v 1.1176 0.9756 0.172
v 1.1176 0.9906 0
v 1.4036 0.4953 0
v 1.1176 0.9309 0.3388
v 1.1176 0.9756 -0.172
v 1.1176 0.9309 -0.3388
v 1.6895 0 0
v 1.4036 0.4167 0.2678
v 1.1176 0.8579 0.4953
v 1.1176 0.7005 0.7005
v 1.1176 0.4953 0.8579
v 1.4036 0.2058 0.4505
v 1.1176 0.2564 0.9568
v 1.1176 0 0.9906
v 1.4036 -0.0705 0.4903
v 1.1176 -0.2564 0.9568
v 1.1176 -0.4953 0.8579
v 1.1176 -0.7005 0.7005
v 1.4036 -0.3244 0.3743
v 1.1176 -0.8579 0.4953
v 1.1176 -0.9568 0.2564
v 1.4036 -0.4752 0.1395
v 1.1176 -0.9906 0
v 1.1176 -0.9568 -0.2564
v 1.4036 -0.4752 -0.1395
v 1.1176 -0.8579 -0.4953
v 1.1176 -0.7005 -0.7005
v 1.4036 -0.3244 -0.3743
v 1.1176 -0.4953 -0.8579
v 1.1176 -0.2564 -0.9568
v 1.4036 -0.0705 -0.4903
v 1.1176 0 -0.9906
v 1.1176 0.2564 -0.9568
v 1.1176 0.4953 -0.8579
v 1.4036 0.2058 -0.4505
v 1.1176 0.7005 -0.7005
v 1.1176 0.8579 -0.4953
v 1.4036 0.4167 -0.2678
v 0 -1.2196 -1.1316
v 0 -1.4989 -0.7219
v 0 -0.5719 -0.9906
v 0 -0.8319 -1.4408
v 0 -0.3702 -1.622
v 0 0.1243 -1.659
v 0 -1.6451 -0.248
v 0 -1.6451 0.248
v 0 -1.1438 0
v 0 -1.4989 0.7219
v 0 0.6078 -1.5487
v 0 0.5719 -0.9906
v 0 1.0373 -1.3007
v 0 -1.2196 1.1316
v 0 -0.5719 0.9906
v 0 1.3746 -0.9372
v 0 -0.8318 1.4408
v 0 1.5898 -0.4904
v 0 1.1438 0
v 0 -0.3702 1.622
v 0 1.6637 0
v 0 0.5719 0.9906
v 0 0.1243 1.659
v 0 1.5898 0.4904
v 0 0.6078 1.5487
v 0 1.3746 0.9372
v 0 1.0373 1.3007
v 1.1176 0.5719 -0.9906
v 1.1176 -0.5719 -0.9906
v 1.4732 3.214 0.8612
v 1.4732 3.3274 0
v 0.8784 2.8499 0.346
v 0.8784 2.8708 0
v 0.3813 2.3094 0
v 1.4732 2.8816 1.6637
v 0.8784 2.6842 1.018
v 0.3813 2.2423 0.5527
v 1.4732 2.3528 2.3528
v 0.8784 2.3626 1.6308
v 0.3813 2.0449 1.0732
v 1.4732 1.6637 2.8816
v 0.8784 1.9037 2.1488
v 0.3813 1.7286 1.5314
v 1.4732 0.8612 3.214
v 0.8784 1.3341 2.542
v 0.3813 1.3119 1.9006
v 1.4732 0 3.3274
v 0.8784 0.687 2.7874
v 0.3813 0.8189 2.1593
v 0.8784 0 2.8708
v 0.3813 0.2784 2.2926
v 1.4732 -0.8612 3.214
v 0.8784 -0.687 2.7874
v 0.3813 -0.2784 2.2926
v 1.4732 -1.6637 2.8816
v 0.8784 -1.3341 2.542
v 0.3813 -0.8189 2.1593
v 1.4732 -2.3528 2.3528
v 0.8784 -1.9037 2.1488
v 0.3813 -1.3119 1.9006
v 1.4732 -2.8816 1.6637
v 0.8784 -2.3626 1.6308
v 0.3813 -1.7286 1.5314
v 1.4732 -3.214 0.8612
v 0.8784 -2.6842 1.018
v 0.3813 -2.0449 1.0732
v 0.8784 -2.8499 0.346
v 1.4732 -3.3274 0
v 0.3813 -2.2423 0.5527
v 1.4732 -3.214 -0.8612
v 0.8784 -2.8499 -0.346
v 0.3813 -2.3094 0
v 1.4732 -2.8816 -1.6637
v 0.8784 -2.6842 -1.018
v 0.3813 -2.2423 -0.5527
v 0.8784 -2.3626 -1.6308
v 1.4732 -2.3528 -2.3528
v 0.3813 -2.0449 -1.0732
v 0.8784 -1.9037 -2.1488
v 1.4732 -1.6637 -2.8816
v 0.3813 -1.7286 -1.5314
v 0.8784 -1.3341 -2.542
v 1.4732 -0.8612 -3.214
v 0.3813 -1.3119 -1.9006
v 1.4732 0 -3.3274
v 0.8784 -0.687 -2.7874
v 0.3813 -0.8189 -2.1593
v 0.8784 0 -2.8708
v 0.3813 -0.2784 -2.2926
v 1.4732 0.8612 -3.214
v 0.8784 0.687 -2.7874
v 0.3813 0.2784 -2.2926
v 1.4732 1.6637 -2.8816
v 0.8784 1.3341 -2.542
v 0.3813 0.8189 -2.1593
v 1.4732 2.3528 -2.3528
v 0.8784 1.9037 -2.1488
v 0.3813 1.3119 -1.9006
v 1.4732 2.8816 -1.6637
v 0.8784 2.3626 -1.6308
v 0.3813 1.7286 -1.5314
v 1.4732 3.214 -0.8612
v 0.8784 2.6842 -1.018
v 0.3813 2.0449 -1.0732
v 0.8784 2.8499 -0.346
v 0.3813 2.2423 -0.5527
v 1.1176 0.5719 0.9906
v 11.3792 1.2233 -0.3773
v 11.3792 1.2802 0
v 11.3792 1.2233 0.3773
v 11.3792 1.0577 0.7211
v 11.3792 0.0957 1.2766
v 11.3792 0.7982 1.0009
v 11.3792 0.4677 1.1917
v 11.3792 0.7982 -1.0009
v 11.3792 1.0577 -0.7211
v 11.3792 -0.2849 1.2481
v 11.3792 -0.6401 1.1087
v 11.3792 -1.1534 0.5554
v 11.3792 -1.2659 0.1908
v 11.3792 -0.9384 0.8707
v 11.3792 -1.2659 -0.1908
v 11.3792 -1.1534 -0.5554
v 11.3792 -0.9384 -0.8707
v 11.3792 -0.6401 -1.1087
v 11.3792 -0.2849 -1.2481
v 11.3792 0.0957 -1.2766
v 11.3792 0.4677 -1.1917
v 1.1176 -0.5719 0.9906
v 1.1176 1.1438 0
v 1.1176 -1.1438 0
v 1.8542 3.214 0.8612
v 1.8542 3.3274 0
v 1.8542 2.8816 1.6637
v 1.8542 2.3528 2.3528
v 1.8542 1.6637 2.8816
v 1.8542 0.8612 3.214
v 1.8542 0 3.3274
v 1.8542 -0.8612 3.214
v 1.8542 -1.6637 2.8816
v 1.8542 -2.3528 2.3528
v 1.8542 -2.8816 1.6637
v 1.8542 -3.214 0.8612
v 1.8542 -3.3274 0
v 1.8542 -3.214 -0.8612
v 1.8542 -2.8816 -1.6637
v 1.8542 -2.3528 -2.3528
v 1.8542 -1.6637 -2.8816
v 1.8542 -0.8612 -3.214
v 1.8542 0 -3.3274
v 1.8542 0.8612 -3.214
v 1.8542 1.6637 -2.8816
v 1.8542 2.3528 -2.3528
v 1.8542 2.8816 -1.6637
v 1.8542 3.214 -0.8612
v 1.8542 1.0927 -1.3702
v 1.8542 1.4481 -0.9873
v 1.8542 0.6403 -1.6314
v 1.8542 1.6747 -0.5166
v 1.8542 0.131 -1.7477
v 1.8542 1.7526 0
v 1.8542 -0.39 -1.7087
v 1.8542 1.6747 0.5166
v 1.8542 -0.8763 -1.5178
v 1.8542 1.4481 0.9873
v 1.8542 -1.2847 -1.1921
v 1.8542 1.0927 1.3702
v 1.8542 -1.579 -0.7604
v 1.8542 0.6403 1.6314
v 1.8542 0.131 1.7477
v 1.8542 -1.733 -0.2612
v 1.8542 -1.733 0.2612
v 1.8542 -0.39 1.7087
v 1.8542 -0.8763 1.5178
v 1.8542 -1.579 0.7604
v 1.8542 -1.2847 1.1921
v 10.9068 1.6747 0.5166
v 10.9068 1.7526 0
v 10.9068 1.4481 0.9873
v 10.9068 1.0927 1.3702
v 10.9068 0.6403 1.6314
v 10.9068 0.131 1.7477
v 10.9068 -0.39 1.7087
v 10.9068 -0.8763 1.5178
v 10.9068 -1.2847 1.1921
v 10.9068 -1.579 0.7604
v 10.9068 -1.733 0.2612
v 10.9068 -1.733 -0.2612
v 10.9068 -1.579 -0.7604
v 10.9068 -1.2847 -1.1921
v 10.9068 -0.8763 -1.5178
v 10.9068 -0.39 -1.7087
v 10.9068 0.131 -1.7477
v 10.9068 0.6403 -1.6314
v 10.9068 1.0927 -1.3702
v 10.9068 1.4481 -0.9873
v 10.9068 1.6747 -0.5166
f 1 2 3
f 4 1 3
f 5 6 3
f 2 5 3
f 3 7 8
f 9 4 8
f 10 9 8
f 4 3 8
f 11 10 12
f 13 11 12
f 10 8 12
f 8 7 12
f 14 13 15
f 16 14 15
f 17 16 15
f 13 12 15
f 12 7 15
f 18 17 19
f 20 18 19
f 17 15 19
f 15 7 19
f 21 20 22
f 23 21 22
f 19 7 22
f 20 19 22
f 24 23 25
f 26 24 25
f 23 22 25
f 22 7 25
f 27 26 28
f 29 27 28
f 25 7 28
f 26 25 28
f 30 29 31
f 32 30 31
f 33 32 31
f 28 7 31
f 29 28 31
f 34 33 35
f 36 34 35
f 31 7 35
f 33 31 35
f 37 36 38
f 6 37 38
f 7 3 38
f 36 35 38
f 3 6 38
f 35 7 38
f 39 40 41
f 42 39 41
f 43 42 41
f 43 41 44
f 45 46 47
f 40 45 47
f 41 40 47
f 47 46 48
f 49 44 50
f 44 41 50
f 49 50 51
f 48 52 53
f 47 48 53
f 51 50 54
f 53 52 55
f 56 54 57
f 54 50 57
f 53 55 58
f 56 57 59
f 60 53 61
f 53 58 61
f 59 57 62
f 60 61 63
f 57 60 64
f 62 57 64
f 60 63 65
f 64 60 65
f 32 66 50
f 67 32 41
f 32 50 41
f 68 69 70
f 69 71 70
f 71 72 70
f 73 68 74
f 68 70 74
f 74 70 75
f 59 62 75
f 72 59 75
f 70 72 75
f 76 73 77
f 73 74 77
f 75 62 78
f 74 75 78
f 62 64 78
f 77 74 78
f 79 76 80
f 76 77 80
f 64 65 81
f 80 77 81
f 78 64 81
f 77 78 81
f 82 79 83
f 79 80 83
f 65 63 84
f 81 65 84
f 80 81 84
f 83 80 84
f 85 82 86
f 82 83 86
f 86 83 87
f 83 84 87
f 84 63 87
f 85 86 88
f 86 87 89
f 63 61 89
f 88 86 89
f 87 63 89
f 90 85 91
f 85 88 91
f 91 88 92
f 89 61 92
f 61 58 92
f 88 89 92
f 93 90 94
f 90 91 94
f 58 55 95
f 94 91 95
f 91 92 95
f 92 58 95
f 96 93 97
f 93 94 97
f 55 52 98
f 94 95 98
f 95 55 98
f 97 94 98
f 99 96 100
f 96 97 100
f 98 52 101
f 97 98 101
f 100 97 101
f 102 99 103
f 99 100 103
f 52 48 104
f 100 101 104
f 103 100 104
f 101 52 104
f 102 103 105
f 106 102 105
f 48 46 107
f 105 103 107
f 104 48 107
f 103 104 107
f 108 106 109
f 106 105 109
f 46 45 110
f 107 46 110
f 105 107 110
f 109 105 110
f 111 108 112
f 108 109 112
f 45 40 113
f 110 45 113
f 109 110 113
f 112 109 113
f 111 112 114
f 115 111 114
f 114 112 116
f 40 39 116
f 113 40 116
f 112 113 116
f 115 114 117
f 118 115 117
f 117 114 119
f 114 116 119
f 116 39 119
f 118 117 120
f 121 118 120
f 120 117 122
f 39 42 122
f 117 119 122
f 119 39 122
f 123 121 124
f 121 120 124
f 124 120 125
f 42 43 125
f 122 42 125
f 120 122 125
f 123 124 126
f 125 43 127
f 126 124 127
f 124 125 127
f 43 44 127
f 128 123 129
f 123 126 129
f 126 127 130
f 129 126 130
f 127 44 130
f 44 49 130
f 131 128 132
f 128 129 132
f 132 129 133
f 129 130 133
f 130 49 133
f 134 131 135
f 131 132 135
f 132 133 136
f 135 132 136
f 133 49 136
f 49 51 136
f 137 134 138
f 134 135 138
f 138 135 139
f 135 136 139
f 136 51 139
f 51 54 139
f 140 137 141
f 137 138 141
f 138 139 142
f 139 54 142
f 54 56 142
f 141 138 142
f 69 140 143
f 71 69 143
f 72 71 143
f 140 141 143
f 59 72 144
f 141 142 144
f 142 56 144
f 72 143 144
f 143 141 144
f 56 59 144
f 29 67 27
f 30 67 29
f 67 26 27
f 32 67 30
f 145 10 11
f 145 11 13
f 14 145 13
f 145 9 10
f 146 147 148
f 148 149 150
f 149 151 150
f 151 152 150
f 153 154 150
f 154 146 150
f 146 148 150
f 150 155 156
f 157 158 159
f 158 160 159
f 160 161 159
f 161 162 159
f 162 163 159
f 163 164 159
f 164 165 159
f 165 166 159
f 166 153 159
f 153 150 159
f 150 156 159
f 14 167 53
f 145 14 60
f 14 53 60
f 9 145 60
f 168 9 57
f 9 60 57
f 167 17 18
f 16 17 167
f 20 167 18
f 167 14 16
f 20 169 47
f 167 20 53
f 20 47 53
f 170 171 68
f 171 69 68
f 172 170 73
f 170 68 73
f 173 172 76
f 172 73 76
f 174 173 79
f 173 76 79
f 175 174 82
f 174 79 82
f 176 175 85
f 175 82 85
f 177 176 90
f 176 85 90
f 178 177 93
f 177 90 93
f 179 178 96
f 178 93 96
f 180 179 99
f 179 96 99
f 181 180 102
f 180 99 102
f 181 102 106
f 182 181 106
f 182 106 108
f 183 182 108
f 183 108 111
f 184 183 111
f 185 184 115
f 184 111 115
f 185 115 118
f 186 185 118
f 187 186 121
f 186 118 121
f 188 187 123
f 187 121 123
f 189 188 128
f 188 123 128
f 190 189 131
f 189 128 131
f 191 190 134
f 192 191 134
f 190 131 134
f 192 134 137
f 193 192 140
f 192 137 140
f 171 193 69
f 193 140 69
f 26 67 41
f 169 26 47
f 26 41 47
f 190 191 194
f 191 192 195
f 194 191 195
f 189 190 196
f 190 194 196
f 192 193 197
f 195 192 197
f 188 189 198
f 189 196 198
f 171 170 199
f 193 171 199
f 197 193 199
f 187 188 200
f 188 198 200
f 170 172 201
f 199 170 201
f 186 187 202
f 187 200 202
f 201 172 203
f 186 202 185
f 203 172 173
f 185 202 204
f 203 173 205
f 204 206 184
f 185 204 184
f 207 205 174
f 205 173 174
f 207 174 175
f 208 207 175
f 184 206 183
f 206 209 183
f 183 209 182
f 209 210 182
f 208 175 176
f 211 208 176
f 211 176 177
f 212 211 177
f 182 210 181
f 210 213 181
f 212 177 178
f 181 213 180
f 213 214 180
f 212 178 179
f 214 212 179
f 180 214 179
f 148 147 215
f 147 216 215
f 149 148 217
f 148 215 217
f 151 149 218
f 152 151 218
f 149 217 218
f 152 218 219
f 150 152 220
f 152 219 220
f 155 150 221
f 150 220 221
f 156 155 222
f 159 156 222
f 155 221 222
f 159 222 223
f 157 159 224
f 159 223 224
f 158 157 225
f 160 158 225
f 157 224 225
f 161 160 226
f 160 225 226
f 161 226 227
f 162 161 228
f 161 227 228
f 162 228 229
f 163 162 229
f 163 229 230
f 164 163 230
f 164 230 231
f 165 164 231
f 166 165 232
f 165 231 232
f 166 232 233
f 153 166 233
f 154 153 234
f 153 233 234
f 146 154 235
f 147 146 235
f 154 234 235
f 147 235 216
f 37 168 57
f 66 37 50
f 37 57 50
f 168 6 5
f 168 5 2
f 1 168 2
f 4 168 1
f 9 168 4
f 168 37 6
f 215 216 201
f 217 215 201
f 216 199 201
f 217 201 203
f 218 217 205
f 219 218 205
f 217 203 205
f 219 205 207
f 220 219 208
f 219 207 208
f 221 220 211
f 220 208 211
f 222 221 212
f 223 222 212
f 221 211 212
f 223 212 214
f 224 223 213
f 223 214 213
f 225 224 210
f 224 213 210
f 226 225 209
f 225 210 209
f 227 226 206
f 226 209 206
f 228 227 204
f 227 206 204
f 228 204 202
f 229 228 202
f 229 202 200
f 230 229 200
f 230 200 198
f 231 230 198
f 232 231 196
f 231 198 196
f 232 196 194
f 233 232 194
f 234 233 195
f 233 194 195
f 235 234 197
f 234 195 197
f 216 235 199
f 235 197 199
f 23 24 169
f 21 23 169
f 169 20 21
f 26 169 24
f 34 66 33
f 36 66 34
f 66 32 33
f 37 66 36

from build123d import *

# Parameters (mm, degrees)
HEX_2_DEPTH = 1.1176


with BuildPart() as part:
    # BodySke → BaseBody (revolve)
    with BuildSketch(Plane.XY):
        with BuildLine():
            Line((11.3792, 0), (11.3792, 1.28016))
            Line((11.3792, 1.28016), (10.90676, 1.7526))
            Line((10.90676, 1.7526), (1.8542, 1.7526))
            Line((1.8542, 1.7526), (1.8542, 3.3274))
            Line((1.8542, 3.3274), (1.4732, 3.3274))
            ThreePointArc((1.4732, 3.3274), (0.616396771, 2.601989501), (0, 1.6637))
            Line((0, 1.6637), (0, 0))
            Line((0, 0), (11.3792, 0))
        make_face()
    revolve(axis=Axis((0, 0, 0), (1, 0, 0)))

    # Sketch2 → PreBroach (revolve, cut)
    with BuildSketch(Plane.XY):
        Polygon((0, 0.9906), (1.1176, 0.9906), (1.689523177, 0), (0, 0), align=None)
    revolve(axis=Axis((0, 0, 0), (1, 0, 0)), mode=Mode.SUBTRACT)

    # Sketch3 → Hex 2 (cut)
    with BuildSketch(Plane(origin=(0, 0, 0), x_dir=(0, 0, -1), z_dir=(1, 0, 0))):
        Polygon((-0.9906, -0.571923177), (-0.9906, 0.571923177), (0, 1.143846353), (0.9906, 0.571923177), (0.9906, -0.571923177), (0, -1.143846353), align=None)
    extrude(amount=HEX_2_DEPTH, mode=Mode.SUBTRACT)


solid = part.part
